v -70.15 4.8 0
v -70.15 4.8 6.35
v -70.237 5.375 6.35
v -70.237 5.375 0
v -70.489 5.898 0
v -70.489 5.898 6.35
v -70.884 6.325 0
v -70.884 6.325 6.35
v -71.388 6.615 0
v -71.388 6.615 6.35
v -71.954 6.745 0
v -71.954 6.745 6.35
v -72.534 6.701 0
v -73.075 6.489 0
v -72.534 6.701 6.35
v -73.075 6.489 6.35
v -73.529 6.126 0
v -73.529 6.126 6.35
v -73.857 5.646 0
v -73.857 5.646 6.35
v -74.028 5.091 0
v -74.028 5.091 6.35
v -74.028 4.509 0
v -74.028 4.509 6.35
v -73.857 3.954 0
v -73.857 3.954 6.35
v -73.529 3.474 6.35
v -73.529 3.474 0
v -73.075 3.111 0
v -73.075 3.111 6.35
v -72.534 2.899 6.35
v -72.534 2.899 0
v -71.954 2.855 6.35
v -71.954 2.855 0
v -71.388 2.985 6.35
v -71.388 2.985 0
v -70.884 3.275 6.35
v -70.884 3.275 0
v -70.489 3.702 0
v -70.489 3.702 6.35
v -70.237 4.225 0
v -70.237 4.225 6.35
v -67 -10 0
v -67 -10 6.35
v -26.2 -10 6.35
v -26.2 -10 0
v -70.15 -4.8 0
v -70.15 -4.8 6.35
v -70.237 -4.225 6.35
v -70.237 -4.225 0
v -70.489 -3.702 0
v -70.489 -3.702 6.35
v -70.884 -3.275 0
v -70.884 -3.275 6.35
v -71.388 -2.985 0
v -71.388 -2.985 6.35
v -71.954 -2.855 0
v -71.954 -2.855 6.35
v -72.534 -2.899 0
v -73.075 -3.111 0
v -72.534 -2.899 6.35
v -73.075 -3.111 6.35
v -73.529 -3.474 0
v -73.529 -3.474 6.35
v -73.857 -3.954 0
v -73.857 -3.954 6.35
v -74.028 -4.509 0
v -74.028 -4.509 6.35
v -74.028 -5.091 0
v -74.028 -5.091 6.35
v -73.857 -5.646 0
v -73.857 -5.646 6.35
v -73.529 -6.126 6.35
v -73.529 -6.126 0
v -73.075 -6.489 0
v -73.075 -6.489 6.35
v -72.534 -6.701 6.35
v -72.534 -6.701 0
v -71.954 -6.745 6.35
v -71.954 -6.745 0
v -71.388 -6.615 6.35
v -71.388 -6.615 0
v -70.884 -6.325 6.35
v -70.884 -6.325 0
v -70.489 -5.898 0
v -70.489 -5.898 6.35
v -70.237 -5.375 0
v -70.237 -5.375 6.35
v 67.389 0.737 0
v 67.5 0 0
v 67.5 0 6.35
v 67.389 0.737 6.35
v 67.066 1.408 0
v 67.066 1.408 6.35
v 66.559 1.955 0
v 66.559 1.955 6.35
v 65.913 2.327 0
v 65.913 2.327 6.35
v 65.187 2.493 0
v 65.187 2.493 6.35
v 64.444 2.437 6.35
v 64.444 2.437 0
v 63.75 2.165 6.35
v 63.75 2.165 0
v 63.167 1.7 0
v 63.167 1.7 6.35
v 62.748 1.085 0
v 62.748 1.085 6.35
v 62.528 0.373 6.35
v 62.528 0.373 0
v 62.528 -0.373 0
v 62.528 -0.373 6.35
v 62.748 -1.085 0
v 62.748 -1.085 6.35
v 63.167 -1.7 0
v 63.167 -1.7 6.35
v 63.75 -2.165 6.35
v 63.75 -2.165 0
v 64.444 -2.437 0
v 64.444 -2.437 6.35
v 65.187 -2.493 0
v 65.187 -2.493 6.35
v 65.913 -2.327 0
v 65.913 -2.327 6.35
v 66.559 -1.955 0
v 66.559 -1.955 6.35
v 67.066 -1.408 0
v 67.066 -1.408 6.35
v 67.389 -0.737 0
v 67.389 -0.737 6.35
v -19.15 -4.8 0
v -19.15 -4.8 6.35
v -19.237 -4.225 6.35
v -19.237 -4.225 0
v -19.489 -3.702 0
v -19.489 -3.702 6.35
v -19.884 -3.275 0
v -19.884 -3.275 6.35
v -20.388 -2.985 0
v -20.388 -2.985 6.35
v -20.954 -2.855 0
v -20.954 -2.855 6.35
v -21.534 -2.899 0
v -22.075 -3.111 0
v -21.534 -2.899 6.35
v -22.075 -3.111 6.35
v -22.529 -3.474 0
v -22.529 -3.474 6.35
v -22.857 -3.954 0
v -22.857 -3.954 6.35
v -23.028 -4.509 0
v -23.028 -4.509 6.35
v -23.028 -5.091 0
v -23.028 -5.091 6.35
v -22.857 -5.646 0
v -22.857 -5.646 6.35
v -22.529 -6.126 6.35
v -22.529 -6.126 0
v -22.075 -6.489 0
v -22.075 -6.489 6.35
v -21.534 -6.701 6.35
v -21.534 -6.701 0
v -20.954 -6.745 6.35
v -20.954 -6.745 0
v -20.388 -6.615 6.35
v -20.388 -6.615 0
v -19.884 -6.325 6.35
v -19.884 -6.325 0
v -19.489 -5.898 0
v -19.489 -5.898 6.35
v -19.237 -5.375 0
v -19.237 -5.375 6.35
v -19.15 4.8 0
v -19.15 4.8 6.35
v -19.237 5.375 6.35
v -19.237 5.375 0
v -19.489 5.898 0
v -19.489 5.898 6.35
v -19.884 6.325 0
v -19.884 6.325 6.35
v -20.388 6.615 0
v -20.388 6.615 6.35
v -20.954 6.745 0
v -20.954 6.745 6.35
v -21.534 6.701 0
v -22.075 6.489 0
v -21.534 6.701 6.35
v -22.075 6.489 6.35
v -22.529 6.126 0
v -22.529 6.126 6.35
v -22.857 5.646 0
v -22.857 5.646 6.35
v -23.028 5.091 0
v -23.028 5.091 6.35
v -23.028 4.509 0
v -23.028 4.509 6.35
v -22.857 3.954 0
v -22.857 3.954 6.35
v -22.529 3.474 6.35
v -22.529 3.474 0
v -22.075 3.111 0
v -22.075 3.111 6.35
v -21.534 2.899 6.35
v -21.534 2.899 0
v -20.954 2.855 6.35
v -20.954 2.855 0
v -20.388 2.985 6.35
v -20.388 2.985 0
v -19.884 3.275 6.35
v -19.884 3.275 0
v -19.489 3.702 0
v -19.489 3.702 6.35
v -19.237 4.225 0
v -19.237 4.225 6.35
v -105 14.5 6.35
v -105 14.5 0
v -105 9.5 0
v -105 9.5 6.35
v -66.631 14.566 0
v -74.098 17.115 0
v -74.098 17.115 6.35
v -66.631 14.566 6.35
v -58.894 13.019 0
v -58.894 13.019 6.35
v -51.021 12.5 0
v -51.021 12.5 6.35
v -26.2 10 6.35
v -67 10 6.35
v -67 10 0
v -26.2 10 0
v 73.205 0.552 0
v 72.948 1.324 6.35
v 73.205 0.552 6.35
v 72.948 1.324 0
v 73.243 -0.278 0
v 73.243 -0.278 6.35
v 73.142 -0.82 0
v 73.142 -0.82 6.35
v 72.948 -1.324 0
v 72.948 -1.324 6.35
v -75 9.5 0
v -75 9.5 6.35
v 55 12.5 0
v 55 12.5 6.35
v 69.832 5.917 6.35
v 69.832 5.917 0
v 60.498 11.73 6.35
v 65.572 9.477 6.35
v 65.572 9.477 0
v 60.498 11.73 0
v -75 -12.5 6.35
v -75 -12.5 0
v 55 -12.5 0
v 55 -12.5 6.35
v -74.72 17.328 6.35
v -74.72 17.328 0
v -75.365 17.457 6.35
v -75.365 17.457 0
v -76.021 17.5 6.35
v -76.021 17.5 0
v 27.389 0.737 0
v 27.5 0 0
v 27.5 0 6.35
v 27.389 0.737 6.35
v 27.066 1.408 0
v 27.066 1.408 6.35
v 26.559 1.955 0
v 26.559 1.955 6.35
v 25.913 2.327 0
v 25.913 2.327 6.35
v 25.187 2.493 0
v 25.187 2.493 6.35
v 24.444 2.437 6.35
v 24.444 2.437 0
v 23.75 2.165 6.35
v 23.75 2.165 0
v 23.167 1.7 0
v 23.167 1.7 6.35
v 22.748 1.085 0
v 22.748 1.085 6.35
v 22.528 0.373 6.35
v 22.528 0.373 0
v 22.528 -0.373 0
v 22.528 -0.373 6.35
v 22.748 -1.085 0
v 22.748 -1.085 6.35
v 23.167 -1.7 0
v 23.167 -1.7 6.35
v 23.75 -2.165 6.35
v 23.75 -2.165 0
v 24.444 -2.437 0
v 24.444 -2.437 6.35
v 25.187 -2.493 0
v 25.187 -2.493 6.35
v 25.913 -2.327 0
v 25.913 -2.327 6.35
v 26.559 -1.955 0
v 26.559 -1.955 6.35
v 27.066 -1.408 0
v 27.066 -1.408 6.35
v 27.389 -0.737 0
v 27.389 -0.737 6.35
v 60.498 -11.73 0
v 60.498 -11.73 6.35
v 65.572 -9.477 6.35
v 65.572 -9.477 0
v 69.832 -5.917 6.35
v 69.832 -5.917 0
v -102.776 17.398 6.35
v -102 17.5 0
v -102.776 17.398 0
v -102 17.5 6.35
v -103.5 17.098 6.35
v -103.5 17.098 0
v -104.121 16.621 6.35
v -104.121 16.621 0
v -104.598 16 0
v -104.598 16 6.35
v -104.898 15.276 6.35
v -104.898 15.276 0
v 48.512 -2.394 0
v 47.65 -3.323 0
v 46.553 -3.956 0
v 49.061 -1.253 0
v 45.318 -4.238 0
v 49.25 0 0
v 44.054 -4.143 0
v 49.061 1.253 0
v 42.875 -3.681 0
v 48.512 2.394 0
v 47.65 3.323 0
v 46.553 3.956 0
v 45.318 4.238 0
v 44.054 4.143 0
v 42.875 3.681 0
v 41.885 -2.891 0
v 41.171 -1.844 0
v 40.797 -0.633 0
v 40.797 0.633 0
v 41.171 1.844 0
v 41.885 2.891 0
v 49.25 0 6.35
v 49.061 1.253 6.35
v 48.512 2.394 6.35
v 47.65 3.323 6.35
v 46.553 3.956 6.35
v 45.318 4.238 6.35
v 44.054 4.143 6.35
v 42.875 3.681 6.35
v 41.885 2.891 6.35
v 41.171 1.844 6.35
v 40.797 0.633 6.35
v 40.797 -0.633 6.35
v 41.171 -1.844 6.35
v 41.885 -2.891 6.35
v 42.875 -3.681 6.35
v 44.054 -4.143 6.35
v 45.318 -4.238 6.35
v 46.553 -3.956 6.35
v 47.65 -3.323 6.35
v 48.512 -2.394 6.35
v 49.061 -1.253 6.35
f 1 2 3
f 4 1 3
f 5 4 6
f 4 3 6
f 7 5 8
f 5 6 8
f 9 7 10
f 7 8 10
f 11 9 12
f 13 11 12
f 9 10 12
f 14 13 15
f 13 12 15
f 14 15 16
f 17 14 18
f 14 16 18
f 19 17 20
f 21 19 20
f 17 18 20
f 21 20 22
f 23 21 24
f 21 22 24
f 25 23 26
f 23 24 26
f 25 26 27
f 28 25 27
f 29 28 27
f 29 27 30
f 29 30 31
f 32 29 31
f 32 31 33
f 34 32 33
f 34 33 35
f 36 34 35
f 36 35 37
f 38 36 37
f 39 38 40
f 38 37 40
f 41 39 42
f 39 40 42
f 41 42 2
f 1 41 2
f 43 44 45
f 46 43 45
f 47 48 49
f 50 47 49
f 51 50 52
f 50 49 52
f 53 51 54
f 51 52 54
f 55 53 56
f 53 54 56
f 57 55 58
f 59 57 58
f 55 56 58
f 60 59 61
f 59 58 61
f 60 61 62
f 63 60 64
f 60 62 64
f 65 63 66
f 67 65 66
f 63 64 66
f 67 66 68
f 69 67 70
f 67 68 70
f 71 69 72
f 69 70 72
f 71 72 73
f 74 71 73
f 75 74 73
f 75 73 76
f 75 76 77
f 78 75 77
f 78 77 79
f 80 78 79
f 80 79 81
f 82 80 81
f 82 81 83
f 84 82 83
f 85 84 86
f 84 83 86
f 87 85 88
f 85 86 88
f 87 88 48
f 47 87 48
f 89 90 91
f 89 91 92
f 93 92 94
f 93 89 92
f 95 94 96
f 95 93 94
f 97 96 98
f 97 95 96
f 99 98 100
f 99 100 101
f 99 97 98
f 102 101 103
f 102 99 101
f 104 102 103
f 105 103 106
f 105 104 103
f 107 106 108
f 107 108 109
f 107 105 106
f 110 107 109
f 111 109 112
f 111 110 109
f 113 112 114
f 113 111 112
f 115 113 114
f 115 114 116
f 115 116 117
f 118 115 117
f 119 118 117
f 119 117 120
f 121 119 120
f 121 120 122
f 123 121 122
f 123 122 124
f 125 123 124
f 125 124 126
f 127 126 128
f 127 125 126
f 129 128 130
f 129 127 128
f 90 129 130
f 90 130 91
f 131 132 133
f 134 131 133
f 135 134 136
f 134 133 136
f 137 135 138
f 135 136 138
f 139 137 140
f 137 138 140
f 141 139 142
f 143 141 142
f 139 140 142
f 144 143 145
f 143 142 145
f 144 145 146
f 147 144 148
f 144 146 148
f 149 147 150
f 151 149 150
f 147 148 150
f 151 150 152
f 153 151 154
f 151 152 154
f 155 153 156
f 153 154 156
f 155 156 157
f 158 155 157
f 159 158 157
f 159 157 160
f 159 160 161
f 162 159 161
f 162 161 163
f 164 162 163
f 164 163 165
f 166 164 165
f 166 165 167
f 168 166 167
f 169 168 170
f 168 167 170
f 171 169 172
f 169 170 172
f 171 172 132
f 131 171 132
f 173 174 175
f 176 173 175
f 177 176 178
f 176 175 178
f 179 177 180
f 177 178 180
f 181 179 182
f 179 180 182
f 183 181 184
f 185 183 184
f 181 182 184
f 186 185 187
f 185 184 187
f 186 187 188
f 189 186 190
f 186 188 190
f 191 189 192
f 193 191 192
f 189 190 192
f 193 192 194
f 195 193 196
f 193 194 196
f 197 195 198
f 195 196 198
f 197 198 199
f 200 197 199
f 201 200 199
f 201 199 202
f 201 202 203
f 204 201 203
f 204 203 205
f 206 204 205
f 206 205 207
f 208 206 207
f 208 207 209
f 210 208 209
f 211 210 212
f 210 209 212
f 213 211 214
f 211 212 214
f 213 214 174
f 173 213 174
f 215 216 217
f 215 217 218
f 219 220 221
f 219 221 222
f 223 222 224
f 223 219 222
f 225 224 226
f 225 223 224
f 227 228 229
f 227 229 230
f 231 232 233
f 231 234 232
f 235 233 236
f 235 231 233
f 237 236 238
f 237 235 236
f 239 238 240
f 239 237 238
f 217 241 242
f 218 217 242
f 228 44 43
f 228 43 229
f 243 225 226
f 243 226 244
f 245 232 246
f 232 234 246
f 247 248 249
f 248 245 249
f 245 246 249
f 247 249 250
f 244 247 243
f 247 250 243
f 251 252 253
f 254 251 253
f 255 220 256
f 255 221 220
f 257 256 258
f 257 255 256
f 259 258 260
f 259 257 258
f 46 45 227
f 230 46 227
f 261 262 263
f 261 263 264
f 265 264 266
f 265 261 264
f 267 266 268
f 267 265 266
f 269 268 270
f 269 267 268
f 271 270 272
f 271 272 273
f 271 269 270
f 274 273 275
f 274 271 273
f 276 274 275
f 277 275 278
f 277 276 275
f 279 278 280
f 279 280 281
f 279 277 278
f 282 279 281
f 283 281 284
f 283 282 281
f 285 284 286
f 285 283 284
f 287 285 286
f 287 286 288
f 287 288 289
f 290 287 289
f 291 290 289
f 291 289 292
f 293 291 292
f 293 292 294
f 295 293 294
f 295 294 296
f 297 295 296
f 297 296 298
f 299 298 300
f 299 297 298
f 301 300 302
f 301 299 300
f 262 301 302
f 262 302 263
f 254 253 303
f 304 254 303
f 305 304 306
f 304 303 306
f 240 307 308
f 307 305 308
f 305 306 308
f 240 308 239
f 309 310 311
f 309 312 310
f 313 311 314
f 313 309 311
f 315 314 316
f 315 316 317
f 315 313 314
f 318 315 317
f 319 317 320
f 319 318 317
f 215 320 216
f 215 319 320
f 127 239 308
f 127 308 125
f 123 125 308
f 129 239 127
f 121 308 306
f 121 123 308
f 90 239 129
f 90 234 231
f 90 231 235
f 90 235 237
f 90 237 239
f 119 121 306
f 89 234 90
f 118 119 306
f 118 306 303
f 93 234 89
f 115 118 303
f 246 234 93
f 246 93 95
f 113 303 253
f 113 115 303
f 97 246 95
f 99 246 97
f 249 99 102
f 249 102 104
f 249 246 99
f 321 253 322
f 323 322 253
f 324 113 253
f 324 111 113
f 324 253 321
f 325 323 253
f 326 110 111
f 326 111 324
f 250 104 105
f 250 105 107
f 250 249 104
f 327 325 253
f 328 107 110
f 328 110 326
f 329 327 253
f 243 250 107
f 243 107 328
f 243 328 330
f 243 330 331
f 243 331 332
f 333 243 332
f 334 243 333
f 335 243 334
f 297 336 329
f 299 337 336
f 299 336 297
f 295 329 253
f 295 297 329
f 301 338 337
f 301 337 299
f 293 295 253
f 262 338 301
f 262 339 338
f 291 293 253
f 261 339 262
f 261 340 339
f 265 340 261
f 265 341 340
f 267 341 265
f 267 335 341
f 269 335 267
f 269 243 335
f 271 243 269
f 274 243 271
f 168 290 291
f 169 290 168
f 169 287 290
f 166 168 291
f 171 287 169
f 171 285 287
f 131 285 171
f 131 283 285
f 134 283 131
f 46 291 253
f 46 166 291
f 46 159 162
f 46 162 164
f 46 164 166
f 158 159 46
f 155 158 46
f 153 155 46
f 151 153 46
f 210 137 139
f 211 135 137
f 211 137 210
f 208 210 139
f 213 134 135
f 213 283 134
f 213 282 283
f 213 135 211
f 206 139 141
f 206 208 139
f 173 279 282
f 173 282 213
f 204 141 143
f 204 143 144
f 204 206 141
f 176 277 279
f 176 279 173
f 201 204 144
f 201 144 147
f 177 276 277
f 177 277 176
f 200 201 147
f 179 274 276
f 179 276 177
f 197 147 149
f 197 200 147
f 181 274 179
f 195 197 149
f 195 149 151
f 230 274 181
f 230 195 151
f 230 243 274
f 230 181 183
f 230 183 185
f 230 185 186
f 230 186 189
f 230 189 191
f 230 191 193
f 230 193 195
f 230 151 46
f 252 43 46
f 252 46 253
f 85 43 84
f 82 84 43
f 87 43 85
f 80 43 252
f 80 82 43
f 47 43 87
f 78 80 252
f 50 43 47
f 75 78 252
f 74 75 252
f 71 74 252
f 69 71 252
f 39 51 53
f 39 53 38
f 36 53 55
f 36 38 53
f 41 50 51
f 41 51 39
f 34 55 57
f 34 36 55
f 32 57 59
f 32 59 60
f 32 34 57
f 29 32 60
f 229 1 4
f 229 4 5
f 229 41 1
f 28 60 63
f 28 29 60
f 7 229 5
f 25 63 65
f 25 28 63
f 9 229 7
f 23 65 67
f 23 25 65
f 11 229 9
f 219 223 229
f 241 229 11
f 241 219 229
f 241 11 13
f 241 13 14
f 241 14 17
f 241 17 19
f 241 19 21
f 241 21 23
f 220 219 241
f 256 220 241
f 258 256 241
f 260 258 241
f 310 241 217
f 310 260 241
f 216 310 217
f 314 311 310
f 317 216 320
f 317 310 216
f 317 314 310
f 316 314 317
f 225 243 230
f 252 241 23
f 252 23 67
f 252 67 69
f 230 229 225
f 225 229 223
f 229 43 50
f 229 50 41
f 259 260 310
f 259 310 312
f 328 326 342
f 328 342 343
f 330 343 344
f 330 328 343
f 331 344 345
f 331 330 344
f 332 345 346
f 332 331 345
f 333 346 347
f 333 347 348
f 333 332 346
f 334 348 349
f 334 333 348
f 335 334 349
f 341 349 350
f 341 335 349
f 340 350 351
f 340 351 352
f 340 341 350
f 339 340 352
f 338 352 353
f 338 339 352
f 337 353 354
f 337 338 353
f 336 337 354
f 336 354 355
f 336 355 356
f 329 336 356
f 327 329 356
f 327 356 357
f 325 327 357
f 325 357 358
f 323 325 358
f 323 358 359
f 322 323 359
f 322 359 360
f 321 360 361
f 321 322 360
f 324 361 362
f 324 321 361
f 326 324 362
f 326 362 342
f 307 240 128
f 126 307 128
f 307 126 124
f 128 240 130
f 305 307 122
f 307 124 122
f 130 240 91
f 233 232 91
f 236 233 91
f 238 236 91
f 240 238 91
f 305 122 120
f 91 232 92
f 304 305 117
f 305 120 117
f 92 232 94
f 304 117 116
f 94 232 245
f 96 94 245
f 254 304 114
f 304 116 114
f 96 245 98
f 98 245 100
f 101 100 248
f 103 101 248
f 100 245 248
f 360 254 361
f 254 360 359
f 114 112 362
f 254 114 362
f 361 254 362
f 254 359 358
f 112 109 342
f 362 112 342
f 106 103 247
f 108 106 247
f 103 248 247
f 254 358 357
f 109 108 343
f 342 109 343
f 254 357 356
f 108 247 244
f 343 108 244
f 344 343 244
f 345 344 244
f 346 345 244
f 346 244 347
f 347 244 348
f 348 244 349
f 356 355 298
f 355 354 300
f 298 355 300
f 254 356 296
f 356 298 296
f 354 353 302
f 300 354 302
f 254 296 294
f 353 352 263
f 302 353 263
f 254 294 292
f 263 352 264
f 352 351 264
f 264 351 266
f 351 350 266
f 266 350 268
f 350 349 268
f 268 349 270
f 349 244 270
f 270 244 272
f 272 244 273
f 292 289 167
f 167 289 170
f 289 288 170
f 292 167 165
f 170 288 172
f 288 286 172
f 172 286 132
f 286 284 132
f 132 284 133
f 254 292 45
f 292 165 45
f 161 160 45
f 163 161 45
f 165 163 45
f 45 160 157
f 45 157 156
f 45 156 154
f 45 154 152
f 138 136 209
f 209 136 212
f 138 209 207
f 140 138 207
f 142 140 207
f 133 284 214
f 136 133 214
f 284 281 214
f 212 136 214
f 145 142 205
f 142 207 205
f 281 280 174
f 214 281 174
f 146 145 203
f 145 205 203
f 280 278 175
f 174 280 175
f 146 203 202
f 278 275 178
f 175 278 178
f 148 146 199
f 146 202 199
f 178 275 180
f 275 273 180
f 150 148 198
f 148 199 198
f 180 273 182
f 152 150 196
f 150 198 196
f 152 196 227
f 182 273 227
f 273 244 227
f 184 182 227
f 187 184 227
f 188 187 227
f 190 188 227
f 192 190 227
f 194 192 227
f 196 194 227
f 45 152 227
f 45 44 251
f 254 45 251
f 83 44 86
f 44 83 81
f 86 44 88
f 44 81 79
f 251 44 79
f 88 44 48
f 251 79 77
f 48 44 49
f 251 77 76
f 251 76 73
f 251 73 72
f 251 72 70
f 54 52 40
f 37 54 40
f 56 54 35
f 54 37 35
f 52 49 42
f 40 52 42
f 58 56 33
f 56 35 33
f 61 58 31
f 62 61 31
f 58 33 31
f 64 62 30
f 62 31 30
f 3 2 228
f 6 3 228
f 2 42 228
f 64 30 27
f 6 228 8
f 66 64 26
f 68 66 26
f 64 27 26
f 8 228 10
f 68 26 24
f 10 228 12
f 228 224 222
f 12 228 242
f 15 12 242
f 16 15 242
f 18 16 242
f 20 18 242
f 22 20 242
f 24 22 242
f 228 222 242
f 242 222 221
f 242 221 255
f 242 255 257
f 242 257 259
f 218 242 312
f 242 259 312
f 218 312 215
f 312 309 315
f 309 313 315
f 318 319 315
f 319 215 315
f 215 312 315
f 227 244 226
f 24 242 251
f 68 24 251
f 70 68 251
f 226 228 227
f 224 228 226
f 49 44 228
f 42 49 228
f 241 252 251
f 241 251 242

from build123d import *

# Parameters (mm, degrees)
SKETCH1_W           = 150
SKETCH1_H           = 25
SKETCH1_R           = 2.5
SKETCH1_R_2         = 4.25
BOSS_EXTRUDE1_DEPTH = 6.35
FILLET1_R           = 20
SKETCH2_R           = 1.95
SKETCH2_W           = 40.8
SKETCH2_H           = 20
CUT_EXTRUDE1_DEPTH  = 6.35
SKETCH3_W           = 6.35
SKETCH3_H           = 8
BOSS_EXTRUDE2_DEPTH = 30
FILLET2_R           = 60
FILLET4_R           = 5
FILLET5_R           = 3


with BuildPart() as part:
    # Sketch1 → Boss-Extrude1 (new body)
    with BuildSketch(Plane.XY):
        Rectangle(SKETCH1_W, SKETCH1_H)
        with Locations((65, 0)):
            Circle(SKETCH1_R, mode=Mode.SUBTRACT)
        with Locations((25, 0)):
            Circle(SKETCH1_R, mode=Mode.SUBTRACT)
        with Locations((45, 0)):
            Circle(SKETCH1_R_2, mode=Mode.SUBTRACT)
    extrude(amount=BOSS_EXTRUDE1_DEPTH)

    # Fillet1
    # the kernel refuses this fillet: 20 mm, written as the material it takes off along each edge
    with BuildSketch(Plane(origin=(75, 12.5, -50), x_dir=(-1, 0, 0), z_dir=(0, 0, 1))) as fillet1_piece_1:
        with BuildLine():
            CenterArc((FILLET1_R, FILLET1_R), FILLET1_R, 180, 90)
            Line((0, FILLET1_R), (0, 0))
            Line((0, 0), (FILLET1_R, 0))
        make_face()
    extrude(amount=106.35, mode=Mode.SUBTRACT)
    with BuildSketch(Plane(origin=(75, -12.5, -50), x_dir=(-1, 0, 0), z_dir=(0, 0, 1))) as fillet1_piece_2:
        with BuildLine():
            CenterArc((FILLET1_R, -FILLET1_R), FILLET1_R, 90, 90)
            Line((0, -FILLET1_R), (0, 0))
            Line((0, 0), (FILLET1_R, 0))
        make_face()
    extrude(amount=106.35, mode=Mode.SUBTRACT)

    # Sketch2 → Cut-Extrude1 (cut)
    with BuildSketch(Plane.XY.offset(6.35)):
        with Locations((-72.1, 4.8)):
            Circle(SKETCH2_R)
        with Locations((-72.1, -4.8)):
            Circle(SKETCH2_R)
        with Locations((-21.1, 4.8)):
            Circle(SKETCH2_R)
        with Locations((-21.1, -4.8)):
            Circle(SKETCH2_R)
        with Locations((-46.6, 0)):
            Rectangle(SKETCH2_W, SKETCH2_H)
    extrude(amount=-CUT_EXTRUDE1_DEPTH, mode=Mode.SUBTRACT)

    # Sketch3 → Boss-Extrude2 (add)
    with BuildSketch(Plane.ZY.offset(75)):
        with Locations((3.175, 13.5)):
            Rectangle(SKETCH3_W, SKETCH3_H)
    extrude(amount=BOSS_EXTRUDE2_DEPTH)

    # Fillet2
    # the kernel refuses this fillet: 60 mm, written as the material it adds along each edge
    with BuildSketch(Plane(origin=(-75, 12.5, 0), x_dir=(1, 0, 0), z_dir=(0, 0, 1))) as fillet2_piece_1:
        with BuildLine():
            CenterArc((23.979157617, 60), FILLET2_R, 246.443535691, 23.556464309)
            Line((0, 5), (-0.479583152, 3.9))
            ThreePointArc((-0.479583152, 3.9), (-1.2, 2.5), (-1.2, 0))
            Line((-1.2, 0), (0, -1.2))
            Line((0, -1.2), (23.979157617, -1.2))
            Line((23.979157617, -1.2), (23.979157617, 0))
        make_face()
    extrude(amount=6.35)

    # Fillet4
    fillet4_edges = [part.edges().sort_by_distance(p)[0] for p in [
        (-75, 17.5, 3.175),
    ]]
    fillet(fillet4_edges, radius=FILLET4_R)

    # Fillet5
    fillet5_edges = [part.edges().sort_by_distance(p)[0] for p in [
        (73.540496218, 0, 3.175),
        (-105, 17.5, 3.175),
    ]]
    fillet(fillet5_edges, radius=FILLET5_R)


solid = part.part
